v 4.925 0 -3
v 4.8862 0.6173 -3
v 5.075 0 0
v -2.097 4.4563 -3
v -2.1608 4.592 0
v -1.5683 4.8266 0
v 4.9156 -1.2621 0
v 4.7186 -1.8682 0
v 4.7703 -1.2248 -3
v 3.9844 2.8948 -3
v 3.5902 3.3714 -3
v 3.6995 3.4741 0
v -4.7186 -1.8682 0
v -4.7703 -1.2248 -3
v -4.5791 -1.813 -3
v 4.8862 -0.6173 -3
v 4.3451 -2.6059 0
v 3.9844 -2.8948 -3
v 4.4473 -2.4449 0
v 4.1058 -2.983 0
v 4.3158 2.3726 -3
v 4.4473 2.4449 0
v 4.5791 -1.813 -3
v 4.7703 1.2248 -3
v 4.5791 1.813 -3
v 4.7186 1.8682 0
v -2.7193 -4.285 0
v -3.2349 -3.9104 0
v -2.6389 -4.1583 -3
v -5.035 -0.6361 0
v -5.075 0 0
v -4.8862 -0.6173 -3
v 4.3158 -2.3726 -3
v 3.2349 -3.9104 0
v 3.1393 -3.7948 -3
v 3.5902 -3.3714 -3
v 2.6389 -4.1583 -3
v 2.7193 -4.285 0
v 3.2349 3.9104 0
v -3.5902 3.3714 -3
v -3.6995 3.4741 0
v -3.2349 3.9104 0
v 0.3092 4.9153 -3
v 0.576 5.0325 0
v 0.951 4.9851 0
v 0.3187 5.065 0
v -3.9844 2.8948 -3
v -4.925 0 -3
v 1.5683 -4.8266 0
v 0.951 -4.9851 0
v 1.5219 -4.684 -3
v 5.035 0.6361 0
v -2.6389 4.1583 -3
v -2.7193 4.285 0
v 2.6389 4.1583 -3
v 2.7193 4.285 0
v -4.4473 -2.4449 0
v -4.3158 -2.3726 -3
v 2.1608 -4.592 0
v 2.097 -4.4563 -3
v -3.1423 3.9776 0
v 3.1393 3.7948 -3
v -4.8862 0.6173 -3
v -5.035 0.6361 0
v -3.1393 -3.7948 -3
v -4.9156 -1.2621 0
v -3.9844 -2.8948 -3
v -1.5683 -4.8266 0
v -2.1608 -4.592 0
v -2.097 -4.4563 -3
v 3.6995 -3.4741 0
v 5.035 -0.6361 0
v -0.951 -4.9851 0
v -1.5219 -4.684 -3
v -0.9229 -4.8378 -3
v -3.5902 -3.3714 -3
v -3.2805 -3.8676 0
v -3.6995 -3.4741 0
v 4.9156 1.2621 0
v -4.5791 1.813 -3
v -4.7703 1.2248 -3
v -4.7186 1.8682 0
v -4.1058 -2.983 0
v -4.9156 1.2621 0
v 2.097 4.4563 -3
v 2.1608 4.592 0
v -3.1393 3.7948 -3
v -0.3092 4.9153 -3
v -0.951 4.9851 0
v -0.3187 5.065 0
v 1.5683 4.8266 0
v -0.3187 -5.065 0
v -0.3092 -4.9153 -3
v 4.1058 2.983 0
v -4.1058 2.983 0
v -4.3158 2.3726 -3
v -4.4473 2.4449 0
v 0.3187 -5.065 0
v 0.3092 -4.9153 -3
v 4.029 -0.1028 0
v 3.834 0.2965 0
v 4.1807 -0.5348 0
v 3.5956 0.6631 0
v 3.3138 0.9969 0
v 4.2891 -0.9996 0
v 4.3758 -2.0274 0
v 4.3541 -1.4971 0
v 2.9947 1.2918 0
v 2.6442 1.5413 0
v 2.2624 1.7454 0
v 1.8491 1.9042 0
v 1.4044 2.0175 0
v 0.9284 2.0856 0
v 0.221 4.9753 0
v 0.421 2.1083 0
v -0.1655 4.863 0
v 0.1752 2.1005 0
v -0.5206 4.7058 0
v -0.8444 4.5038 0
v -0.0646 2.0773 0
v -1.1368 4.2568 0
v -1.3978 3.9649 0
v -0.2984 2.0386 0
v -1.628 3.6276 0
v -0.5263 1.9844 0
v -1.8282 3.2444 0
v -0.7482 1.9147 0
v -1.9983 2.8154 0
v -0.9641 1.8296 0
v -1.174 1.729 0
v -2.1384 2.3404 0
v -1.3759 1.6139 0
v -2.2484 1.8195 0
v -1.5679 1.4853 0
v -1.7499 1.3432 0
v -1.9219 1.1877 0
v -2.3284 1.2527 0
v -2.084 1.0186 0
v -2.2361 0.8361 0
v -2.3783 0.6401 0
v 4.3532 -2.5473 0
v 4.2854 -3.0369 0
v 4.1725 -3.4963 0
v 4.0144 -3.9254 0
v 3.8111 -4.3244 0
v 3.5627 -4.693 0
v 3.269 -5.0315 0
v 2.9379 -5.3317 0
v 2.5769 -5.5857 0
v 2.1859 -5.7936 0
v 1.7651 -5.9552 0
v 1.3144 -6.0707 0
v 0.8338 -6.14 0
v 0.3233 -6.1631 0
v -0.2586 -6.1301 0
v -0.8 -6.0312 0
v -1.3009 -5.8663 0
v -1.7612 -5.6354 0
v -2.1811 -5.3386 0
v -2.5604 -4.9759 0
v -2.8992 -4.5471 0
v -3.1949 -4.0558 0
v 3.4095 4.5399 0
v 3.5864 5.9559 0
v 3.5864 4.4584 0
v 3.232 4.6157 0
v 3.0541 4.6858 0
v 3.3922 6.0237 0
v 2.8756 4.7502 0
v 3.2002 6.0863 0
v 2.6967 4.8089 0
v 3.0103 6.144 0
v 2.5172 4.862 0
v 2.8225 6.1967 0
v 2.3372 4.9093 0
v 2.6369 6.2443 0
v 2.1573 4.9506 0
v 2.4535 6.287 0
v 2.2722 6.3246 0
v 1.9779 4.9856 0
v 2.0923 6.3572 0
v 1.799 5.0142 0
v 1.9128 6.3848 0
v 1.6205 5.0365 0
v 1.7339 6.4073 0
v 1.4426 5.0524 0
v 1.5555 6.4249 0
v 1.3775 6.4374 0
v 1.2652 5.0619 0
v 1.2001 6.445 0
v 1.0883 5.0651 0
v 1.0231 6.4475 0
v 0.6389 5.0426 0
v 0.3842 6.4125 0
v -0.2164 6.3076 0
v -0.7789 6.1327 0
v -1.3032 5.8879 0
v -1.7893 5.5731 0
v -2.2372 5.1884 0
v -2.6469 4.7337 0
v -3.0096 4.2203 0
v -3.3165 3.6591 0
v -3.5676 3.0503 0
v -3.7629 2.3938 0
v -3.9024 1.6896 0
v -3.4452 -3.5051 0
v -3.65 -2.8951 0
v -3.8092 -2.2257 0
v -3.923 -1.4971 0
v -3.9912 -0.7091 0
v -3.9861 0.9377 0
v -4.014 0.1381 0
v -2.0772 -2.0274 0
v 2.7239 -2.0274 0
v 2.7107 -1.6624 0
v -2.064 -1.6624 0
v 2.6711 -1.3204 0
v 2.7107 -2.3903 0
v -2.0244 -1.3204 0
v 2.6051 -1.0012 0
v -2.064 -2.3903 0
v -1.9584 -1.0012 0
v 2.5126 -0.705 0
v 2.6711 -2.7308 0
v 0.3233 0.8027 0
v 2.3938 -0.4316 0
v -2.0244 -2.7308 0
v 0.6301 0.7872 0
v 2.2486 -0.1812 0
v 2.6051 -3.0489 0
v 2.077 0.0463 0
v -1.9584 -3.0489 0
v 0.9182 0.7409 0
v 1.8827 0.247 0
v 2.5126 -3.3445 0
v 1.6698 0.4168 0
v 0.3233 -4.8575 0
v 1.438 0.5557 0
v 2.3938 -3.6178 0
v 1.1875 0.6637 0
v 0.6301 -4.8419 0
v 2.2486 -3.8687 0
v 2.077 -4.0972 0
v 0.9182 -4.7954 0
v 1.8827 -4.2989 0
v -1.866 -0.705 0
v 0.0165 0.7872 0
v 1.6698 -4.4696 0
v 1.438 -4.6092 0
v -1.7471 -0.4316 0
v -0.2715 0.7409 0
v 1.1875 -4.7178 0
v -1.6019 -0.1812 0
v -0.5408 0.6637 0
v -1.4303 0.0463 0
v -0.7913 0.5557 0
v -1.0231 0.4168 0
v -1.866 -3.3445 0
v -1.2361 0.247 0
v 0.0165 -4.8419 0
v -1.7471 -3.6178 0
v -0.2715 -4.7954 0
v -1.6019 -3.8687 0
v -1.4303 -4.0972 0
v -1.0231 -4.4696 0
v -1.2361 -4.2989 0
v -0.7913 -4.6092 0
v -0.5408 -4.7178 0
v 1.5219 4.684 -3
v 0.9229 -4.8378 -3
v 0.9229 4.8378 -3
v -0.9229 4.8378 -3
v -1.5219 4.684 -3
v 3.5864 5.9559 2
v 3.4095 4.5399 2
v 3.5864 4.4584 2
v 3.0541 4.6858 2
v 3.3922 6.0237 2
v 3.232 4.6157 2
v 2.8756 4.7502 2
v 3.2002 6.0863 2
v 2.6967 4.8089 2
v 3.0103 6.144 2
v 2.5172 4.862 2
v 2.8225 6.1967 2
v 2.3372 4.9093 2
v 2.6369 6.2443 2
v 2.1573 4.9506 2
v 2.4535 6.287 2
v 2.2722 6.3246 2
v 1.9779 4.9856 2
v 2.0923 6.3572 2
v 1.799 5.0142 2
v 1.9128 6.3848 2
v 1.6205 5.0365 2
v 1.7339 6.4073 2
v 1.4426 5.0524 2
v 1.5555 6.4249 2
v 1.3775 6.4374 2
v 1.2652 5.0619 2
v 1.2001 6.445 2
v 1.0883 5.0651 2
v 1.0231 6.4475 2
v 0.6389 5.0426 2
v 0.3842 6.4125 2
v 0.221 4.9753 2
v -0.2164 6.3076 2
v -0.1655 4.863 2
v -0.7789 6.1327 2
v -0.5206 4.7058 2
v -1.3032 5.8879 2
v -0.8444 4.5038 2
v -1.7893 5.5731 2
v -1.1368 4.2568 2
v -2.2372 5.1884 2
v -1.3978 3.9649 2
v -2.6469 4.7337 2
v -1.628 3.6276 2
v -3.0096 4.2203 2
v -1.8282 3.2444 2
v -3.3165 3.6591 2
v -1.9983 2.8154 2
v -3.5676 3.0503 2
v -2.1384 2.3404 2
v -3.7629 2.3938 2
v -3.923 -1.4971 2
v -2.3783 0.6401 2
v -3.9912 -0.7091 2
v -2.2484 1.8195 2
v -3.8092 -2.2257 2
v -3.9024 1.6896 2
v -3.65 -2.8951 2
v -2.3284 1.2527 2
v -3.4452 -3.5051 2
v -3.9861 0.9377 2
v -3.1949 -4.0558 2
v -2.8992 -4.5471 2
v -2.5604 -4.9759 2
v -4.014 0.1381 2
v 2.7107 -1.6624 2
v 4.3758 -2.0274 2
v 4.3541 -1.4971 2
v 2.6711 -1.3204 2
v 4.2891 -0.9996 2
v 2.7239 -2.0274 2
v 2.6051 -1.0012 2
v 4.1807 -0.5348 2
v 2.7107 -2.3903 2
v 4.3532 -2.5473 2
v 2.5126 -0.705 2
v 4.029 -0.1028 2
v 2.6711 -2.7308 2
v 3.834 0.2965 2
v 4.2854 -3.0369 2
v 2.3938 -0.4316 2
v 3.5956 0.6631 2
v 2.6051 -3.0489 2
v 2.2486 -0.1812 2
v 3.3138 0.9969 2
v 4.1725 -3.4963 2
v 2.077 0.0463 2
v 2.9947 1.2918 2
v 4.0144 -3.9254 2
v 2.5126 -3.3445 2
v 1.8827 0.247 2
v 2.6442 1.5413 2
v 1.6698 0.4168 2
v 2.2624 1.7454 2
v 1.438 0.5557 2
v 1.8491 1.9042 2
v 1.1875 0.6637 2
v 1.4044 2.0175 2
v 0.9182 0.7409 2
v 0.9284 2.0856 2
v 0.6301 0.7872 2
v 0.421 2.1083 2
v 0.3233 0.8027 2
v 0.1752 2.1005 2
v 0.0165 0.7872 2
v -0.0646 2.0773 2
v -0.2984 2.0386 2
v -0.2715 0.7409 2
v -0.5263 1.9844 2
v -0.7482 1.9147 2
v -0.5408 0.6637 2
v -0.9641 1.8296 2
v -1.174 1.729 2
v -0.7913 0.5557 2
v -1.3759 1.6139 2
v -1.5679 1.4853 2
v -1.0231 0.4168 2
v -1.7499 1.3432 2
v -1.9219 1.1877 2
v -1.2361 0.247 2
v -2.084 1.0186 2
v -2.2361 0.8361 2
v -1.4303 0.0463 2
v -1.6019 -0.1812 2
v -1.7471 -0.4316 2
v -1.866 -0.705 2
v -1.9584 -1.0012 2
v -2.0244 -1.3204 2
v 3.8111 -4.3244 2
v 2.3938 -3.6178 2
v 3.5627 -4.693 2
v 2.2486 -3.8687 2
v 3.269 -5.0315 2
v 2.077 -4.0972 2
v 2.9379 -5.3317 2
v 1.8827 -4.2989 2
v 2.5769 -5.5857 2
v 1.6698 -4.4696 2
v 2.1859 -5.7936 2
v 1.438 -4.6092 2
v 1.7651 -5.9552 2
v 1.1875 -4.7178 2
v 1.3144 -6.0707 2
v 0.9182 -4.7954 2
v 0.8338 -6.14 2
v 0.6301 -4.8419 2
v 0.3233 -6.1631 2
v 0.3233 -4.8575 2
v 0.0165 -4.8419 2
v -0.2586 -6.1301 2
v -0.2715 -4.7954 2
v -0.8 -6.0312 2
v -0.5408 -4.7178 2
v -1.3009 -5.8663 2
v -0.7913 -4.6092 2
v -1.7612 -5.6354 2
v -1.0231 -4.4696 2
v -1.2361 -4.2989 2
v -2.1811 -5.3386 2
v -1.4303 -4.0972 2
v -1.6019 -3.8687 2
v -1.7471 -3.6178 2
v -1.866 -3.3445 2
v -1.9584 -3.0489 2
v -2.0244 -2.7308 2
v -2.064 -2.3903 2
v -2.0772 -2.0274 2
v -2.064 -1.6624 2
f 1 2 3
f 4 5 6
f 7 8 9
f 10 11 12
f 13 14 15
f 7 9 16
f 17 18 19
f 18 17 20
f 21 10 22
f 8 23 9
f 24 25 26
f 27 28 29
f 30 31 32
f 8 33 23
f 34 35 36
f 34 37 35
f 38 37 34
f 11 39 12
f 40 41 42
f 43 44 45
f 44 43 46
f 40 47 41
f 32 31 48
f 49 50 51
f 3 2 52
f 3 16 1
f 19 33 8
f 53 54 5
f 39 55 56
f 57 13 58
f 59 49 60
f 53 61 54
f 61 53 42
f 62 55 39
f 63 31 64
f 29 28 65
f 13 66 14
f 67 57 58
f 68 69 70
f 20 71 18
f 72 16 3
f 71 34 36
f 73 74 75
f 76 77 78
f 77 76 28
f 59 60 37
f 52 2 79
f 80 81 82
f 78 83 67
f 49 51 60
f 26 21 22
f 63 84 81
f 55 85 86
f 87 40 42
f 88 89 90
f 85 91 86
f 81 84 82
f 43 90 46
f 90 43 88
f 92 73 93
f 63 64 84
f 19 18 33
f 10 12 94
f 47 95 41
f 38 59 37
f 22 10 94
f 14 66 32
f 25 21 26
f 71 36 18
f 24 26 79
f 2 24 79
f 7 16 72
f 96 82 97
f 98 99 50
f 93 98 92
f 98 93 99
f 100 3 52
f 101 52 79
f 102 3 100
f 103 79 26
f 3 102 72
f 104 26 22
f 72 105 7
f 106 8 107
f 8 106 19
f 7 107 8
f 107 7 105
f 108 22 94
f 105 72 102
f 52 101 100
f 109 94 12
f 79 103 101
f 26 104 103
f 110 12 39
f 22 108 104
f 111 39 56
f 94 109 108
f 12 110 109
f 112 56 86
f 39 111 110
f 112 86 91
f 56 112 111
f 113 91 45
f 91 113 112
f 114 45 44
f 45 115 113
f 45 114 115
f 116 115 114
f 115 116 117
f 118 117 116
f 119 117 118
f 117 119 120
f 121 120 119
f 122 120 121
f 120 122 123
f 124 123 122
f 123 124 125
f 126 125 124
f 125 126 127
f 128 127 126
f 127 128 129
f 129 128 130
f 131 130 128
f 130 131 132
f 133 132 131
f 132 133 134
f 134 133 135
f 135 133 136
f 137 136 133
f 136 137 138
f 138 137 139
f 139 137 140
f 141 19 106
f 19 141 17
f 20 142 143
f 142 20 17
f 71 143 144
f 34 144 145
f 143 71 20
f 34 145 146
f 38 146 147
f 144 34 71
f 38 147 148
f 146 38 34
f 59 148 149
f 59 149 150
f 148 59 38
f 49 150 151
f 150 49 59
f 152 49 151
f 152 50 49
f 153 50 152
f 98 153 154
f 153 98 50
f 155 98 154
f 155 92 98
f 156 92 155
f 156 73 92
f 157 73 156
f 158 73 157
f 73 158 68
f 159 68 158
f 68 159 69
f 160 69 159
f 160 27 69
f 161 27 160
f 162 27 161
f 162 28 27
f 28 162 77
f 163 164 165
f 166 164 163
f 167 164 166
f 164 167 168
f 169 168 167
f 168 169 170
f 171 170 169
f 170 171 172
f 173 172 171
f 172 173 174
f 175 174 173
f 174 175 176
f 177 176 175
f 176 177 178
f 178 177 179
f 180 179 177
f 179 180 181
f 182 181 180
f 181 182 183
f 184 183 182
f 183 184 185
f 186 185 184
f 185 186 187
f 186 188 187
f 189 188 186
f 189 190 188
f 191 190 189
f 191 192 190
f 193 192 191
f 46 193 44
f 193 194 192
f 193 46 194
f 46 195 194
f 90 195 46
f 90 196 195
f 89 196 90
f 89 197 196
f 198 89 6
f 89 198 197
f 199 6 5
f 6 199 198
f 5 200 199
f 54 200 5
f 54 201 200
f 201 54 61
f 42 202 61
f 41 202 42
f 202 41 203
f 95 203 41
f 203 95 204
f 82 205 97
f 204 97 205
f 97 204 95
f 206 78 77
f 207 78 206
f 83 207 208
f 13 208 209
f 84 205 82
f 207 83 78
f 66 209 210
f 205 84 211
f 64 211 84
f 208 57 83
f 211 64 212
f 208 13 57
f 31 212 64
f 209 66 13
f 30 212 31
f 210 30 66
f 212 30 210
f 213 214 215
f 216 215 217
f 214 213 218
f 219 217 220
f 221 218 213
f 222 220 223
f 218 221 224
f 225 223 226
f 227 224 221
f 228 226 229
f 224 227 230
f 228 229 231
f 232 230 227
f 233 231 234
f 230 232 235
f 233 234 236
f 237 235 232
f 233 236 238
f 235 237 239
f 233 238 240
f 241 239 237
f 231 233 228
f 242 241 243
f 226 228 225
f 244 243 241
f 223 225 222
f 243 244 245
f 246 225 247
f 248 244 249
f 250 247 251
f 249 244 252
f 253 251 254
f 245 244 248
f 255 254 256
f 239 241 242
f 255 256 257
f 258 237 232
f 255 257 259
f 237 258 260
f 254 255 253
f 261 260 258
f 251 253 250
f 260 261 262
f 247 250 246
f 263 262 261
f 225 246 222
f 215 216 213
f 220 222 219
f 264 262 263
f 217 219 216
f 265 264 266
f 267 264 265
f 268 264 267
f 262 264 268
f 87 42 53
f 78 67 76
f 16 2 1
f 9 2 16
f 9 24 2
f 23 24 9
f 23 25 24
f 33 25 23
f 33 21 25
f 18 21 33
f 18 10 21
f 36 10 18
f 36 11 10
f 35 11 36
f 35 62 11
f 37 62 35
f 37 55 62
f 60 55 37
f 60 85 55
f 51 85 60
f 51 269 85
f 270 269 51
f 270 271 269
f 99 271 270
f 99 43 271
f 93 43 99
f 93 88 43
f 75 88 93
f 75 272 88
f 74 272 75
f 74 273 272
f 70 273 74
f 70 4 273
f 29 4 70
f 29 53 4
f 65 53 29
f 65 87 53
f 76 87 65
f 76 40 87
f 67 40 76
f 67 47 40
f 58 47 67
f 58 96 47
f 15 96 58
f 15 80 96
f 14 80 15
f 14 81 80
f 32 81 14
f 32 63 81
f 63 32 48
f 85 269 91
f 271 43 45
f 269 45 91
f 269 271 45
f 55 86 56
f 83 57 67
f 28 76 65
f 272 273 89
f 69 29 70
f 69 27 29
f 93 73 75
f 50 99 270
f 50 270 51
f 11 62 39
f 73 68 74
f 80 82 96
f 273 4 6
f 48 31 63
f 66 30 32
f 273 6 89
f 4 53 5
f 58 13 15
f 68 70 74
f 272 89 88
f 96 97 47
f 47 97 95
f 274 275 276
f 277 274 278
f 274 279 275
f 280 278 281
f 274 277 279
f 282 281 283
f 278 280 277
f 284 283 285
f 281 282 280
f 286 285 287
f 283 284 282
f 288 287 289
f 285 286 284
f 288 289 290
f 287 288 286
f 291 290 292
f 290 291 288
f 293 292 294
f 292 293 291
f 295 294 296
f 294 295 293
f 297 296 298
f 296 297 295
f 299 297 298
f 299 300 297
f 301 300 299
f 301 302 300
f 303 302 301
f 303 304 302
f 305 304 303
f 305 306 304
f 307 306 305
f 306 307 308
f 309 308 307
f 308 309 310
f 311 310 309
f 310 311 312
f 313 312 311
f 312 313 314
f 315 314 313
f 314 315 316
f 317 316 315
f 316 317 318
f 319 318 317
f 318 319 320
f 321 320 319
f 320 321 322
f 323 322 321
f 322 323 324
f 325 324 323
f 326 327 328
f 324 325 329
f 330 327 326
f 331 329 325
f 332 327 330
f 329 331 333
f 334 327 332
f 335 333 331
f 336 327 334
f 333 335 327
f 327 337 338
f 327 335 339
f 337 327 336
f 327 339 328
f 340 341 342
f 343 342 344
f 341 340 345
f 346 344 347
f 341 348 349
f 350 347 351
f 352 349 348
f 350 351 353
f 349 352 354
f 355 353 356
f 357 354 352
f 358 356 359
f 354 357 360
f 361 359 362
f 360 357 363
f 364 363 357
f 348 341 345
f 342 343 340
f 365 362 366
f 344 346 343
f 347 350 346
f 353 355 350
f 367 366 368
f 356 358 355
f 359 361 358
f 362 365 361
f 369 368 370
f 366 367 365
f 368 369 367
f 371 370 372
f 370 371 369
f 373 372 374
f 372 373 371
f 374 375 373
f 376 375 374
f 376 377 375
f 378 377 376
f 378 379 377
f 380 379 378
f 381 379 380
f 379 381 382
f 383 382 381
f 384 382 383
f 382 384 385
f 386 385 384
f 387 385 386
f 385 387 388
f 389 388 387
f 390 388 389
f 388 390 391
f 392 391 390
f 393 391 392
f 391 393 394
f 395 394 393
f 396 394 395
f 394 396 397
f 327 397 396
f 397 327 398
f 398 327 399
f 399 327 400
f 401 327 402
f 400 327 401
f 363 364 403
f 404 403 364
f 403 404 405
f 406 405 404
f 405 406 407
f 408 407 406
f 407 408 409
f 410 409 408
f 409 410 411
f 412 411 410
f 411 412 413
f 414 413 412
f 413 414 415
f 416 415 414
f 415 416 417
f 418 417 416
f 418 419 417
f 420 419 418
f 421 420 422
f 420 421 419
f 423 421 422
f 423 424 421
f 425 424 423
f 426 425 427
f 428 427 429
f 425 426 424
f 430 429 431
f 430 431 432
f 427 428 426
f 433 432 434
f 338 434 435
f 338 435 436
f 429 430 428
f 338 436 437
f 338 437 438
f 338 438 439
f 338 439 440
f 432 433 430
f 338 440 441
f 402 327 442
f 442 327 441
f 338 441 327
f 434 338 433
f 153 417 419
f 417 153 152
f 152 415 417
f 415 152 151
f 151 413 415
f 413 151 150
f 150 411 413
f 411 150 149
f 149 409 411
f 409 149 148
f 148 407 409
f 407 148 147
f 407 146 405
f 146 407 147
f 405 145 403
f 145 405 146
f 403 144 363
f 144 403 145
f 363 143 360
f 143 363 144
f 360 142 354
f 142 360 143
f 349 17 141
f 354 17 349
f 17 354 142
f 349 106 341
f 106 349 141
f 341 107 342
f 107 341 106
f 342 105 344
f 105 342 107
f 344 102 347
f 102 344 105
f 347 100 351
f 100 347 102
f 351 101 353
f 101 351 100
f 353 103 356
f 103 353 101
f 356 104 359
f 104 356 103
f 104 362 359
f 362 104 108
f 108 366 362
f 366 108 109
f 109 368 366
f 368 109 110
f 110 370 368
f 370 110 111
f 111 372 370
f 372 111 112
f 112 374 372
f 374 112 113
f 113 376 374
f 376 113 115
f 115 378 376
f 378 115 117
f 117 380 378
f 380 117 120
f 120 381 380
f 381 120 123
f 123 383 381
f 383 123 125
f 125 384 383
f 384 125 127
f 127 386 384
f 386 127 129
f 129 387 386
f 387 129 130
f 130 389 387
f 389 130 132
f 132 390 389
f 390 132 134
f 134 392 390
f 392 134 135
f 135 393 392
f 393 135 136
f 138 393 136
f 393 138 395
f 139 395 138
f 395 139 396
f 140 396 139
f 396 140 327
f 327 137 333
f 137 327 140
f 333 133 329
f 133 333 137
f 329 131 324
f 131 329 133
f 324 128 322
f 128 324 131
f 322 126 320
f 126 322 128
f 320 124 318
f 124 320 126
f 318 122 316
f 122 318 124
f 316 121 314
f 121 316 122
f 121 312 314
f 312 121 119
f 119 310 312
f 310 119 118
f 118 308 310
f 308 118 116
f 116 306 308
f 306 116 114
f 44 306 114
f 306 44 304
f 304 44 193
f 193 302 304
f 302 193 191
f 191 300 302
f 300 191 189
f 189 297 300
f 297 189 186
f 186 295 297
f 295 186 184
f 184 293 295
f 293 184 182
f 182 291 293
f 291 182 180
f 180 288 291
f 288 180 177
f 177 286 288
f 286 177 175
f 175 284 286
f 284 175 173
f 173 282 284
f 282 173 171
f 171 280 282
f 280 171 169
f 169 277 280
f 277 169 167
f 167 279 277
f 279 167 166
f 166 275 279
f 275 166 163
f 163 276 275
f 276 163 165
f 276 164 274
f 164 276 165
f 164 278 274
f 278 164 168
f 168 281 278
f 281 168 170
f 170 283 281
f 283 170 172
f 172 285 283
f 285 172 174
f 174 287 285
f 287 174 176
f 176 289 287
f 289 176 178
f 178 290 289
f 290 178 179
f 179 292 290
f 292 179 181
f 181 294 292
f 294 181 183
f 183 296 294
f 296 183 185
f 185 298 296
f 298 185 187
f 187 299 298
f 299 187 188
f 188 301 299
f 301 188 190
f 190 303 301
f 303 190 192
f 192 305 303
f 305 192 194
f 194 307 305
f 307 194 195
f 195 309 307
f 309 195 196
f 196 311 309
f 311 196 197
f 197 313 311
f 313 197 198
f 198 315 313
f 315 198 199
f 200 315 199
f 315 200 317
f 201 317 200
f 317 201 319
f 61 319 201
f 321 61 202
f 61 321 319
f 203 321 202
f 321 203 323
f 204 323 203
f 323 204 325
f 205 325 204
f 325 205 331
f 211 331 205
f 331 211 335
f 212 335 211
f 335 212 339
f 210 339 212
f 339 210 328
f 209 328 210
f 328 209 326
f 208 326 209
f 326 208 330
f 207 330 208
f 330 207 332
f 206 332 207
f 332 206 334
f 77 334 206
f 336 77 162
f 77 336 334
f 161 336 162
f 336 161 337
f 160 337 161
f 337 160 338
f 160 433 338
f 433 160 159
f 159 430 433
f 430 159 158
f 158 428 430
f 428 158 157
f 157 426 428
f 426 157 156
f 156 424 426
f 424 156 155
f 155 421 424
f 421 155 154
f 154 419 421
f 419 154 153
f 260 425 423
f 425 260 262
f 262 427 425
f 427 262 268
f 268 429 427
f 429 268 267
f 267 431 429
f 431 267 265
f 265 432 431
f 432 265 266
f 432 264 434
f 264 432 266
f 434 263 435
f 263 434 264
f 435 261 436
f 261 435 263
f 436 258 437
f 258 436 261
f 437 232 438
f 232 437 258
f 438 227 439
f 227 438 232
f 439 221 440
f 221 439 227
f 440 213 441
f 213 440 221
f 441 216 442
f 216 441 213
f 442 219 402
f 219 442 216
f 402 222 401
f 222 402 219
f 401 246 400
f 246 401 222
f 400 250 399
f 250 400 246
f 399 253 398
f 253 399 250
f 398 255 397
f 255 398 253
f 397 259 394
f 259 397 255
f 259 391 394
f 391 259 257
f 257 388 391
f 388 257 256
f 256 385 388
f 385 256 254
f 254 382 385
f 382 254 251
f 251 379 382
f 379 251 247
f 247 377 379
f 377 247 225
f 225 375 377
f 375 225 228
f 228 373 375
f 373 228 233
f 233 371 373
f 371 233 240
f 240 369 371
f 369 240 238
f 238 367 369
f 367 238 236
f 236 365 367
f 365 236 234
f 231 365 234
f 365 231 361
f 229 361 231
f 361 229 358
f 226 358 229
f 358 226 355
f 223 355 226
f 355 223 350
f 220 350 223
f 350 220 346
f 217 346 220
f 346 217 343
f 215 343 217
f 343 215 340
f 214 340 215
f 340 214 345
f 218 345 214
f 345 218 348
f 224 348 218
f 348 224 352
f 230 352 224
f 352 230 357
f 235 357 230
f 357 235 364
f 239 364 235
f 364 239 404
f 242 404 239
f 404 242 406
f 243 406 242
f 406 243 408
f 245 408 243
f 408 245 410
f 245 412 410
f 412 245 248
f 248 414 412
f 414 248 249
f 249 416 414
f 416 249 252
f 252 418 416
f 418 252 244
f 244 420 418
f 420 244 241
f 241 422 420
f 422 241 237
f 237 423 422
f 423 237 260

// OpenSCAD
$fn = 50;

difference() {
	union() {
		translate(v = [0, 0, -3.0]) {
			cylinder(h = 3, r1 = 4.925, r2 = 5.075);
		}
		linear_extrude(height = 2) {
			text(font = "Impact", halign = "center", size = 12, text = "6", valign = "center");
		}
	}
	union();
}
